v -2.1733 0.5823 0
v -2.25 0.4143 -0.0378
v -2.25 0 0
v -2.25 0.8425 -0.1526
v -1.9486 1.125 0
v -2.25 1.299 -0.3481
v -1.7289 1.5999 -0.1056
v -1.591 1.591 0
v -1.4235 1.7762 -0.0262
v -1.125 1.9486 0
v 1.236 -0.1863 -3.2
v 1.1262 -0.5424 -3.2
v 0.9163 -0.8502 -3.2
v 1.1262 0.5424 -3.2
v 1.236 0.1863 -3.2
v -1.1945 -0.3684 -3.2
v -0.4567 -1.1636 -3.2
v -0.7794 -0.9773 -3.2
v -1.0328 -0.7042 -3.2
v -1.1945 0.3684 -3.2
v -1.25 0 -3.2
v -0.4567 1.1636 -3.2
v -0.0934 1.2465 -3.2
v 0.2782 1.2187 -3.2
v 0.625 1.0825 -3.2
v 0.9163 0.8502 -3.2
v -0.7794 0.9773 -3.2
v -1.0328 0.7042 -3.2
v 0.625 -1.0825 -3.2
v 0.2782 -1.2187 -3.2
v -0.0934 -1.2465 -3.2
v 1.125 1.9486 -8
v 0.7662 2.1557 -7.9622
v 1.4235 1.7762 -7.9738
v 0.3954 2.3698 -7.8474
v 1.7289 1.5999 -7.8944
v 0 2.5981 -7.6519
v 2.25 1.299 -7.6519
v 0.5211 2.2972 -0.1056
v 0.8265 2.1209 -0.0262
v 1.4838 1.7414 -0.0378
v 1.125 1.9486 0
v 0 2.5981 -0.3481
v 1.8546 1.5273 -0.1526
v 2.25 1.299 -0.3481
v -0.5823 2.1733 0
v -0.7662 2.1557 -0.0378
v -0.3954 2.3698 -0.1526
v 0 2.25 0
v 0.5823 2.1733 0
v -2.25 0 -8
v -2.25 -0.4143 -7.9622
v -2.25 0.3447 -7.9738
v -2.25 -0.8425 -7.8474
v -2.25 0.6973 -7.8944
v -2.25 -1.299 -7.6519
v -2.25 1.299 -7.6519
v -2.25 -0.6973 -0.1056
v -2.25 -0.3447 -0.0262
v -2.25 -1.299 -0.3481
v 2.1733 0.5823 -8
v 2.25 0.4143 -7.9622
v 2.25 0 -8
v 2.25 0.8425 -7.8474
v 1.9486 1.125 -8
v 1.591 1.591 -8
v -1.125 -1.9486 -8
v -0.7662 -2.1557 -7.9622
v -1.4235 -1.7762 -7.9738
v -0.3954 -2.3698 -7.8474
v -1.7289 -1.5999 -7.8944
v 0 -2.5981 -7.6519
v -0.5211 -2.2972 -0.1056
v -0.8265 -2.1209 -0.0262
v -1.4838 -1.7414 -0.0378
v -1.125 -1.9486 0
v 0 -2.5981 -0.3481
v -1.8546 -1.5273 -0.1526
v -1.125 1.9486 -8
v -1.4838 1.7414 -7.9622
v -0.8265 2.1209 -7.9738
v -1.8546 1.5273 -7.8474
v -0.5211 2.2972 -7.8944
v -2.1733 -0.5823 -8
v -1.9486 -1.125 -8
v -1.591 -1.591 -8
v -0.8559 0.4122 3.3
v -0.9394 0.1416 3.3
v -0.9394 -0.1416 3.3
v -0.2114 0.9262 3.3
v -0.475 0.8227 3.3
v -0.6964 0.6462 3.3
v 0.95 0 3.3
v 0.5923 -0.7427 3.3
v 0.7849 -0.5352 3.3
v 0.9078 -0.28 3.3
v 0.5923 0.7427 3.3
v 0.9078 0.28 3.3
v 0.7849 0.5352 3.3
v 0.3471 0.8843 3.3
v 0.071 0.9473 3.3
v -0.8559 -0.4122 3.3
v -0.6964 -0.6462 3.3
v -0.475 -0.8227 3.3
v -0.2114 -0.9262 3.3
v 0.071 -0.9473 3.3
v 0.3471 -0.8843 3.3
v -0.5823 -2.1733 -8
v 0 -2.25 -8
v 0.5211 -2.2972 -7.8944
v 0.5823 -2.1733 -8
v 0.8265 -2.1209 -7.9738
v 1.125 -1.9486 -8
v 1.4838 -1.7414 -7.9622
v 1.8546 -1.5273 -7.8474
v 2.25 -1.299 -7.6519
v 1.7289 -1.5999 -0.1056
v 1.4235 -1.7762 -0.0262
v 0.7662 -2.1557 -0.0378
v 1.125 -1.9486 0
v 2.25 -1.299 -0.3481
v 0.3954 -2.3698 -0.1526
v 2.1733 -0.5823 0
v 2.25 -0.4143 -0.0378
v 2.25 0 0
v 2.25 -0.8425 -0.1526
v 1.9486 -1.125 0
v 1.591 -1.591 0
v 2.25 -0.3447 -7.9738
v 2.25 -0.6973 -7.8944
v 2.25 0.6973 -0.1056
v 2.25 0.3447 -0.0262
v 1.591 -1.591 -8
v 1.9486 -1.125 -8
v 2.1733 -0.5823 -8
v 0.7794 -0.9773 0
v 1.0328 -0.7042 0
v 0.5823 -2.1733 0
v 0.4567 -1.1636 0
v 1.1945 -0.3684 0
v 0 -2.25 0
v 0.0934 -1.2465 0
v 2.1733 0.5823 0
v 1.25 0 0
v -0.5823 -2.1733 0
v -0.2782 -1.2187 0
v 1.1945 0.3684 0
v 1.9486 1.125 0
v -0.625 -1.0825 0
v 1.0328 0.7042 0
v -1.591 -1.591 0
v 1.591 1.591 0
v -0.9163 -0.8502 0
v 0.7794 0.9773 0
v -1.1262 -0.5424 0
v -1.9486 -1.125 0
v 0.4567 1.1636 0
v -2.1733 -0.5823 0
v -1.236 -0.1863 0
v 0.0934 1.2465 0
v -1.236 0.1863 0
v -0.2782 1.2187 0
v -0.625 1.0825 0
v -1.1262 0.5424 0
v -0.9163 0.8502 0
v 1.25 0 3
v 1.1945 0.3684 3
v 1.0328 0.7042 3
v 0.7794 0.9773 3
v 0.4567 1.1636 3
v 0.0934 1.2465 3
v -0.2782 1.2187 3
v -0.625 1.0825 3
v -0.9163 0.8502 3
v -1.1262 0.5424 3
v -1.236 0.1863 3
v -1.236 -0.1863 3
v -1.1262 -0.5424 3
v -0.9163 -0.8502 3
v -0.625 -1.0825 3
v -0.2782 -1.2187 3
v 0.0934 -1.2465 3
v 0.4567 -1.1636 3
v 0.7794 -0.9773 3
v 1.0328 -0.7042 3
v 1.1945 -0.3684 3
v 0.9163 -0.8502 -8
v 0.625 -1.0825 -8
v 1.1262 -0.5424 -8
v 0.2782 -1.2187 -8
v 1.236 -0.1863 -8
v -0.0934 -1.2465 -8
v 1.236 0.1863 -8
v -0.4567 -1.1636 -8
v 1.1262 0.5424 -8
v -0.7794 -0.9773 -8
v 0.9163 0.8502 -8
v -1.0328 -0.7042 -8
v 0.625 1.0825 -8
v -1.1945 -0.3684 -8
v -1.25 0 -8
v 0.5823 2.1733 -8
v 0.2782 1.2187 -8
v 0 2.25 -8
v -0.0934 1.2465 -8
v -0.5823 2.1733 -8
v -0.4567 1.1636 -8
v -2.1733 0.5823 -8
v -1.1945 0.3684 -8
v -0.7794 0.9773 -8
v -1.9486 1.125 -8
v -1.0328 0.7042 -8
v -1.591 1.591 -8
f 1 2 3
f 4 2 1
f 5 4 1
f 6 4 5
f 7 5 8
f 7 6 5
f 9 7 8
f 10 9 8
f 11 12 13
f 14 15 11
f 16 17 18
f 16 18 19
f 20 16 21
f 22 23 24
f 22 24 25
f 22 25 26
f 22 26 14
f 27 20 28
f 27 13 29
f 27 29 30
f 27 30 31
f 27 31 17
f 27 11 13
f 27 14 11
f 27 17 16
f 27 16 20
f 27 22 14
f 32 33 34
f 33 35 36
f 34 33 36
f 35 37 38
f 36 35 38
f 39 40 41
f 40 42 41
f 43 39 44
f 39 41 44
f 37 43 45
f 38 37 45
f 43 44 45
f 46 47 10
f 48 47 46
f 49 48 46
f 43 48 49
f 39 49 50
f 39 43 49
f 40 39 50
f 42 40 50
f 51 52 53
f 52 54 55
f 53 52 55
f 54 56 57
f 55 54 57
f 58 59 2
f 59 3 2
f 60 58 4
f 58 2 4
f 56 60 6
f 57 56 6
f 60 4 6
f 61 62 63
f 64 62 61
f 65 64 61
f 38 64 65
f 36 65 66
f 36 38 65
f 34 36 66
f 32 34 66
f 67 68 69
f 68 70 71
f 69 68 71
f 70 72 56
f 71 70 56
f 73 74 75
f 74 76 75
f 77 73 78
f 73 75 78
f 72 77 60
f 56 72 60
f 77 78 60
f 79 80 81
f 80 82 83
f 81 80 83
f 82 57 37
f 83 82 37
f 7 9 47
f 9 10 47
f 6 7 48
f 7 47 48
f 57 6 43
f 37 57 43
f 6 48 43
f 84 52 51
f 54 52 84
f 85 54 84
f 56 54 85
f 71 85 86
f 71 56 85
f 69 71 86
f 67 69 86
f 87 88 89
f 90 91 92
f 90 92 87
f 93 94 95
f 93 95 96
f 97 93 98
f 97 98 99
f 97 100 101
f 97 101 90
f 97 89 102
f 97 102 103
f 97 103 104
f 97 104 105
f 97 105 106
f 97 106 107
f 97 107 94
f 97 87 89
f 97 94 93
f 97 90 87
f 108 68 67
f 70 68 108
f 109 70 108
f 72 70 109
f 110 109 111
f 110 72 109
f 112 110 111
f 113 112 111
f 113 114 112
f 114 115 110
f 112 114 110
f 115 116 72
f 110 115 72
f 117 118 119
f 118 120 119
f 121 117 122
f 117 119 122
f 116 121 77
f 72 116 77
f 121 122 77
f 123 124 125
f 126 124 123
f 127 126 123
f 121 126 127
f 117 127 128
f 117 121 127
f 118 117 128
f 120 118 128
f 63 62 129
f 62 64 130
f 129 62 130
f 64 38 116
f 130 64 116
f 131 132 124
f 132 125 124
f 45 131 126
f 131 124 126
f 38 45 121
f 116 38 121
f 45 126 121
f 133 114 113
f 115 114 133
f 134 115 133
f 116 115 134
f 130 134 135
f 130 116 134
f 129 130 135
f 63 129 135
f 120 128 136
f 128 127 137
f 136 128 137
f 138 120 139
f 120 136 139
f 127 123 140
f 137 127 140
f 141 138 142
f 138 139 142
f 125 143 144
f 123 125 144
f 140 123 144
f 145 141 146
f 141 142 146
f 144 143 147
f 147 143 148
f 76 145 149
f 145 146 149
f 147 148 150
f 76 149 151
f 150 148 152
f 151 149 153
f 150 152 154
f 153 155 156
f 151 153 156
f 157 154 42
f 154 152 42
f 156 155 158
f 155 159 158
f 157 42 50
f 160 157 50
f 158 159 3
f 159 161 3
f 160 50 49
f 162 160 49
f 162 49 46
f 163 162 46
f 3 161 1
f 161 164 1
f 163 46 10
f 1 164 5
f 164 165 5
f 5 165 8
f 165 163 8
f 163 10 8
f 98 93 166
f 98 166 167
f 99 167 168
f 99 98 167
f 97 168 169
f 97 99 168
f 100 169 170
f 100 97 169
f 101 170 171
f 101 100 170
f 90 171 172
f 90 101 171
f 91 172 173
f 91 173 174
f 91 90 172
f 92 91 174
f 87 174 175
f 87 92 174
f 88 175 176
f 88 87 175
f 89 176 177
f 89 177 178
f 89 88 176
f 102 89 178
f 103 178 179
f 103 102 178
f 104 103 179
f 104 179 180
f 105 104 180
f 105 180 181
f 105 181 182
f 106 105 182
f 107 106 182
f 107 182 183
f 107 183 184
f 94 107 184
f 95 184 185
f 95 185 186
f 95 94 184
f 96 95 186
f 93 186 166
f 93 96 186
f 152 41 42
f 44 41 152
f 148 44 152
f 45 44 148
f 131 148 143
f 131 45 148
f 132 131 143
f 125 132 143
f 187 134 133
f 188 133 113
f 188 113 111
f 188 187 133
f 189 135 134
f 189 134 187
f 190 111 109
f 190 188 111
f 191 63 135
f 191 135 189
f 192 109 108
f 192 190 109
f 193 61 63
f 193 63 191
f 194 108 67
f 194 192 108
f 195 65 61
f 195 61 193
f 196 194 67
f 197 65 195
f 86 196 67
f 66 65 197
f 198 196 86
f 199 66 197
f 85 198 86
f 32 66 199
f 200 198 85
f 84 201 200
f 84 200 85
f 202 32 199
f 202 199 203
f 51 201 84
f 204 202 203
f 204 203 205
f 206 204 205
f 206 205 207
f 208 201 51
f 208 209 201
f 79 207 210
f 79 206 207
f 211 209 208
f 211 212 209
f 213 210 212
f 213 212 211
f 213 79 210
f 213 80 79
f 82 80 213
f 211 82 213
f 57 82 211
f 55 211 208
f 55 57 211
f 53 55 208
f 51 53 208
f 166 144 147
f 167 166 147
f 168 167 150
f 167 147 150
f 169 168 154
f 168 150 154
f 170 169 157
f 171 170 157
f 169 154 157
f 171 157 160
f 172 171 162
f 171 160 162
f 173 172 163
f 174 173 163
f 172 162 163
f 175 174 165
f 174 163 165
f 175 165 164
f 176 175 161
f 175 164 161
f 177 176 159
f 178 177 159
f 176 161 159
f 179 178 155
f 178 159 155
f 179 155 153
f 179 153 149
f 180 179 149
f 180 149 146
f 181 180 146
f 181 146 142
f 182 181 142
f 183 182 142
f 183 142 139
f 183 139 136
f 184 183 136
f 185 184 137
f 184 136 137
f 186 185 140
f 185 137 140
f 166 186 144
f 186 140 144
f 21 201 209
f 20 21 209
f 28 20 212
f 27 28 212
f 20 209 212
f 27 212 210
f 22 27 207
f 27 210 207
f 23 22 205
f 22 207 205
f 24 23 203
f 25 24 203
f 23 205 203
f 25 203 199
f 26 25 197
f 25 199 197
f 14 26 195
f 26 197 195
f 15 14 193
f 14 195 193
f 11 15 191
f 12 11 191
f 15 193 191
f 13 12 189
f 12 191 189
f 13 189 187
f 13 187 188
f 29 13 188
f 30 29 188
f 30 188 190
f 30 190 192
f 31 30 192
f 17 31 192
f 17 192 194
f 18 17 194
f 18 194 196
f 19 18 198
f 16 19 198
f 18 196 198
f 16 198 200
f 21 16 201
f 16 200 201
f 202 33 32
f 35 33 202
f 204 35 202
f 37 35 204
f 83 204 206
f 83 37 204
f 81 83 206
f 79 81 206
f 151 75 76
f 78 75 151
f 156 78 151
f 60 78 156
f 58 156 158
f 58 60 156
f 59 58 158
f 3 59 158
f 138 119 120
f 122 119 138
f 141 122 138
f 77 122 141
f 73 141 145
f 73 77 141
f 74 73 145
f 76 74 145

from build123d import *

# Parameters (mm, degrees)
SKETCH2_R           = 1.25
BOSS_EXTRUDE1_DEPTH = 3.3
BOSS_EXTRUDE2_DEPTH = 8
SKETCH4_R           = 1.25
CUT_EXTRUDE1_DEPTH  = 4.8
SKETCH5_OUTSIDE_W   = 33.746
SKETCH5_OUTSIDE_H   = 34.442
SKETCH5_OUTSIDE_R   = 2.25
CUT_EXTRUDE2_DEPTH  = 12.3
CUT_EXTRUDE2_TAPER  = 45
SKETCH6_OUTSIDE_W   = 27.146
SKETCH6_OUTSIDE_H   = 27.842
SKETCH6_OUTSIDE_R   = 2.25
CUT_EXTRUDE3_DEPTH  = 9
CUT_EXTRUDE3_TAPER  = 45
CHAMFER1_SIZE       = 0.3


with BuildPart() as part:
    # Sketch2 → Boss-Extrude1 (new body)
    with BuildSketch(Plane.XY):
        Circle(SKETCH2_R)
    extrude(amount=BOSS_EXTRUDE1_DEPTH)

    # Sketch3 → Boss-Extrude2 (add)
    with BuildSketch(Plane(origin=(0, 0, 0), x_dir=(-1, 0, 0), z_dir=(0, 0, -1))):
        Polygon((0, 2.598076211), (-2.25, 1.299038106), (-2.25, -1.299038106), (0, -2.598076211), (2.25, -1.299038106), (2.25, 1.299038106), align=None)
    extrude(amount=BOSS_EXTRUDE2_DEPTH)

    # Sketch4 → Cut-Extrude1 (cut)
    with BuildSketch(Plane(origin=(0, 0, -8), x_dir=(-1, 0, 0), z_dir=(0, 0, -1))):
        Circle(SKETCH4_R)
    extrude(amount=-CUT_EXTRUDE1_DEPTH, mode=Mode.SUBTRACT)

    # Sketch5 outside → Cut-Extrude2 (cut, through all)
    with BuildSketch(Plane(origin=(0, 0, -8), x_dir=(-1, 0, 0), z_dir=(0, 0, -1))):
        Rectangle(SKETCH5_OUTSIDE_W, SKETCH5_OUTSIDE_H)
        Circle(SKETCH5_OUTSIDE_R, mode=Mode.SUBTRACT)
    extrude(amount=-CUT_EXTRUDE2_DEPTH, taper=CUT_EXTRUDE2_TAPER, mode=Mode.SUBTRACT)

    # Sketch6 outside → Cut-Extrude3 (cut, through all)
    with BuildSketch(Plane.XY):
        Rectangle(SKETCH6_OUTSIDE_W, SKETCH6_OUTSIDE_H)
        Circle(SKETCH6_OUTSIDE_R, mode=Mode.SUBTRACT)
    extrude(amount=-CUT_EXTRUDE3_DEPTH, taper=CUT_EXTRUDE3_TAPER, mode=Mode.SUBTRACT)

    # Chamfer1
    chamfer1_edges = [part.edges().sort_by_distance(p)[0] for p in [
        (-1.25, 0, 3.3),
    ]]
    chamfer(chamfer1_edges, length=CHAMFER1_SIZE)


solid = part.part
